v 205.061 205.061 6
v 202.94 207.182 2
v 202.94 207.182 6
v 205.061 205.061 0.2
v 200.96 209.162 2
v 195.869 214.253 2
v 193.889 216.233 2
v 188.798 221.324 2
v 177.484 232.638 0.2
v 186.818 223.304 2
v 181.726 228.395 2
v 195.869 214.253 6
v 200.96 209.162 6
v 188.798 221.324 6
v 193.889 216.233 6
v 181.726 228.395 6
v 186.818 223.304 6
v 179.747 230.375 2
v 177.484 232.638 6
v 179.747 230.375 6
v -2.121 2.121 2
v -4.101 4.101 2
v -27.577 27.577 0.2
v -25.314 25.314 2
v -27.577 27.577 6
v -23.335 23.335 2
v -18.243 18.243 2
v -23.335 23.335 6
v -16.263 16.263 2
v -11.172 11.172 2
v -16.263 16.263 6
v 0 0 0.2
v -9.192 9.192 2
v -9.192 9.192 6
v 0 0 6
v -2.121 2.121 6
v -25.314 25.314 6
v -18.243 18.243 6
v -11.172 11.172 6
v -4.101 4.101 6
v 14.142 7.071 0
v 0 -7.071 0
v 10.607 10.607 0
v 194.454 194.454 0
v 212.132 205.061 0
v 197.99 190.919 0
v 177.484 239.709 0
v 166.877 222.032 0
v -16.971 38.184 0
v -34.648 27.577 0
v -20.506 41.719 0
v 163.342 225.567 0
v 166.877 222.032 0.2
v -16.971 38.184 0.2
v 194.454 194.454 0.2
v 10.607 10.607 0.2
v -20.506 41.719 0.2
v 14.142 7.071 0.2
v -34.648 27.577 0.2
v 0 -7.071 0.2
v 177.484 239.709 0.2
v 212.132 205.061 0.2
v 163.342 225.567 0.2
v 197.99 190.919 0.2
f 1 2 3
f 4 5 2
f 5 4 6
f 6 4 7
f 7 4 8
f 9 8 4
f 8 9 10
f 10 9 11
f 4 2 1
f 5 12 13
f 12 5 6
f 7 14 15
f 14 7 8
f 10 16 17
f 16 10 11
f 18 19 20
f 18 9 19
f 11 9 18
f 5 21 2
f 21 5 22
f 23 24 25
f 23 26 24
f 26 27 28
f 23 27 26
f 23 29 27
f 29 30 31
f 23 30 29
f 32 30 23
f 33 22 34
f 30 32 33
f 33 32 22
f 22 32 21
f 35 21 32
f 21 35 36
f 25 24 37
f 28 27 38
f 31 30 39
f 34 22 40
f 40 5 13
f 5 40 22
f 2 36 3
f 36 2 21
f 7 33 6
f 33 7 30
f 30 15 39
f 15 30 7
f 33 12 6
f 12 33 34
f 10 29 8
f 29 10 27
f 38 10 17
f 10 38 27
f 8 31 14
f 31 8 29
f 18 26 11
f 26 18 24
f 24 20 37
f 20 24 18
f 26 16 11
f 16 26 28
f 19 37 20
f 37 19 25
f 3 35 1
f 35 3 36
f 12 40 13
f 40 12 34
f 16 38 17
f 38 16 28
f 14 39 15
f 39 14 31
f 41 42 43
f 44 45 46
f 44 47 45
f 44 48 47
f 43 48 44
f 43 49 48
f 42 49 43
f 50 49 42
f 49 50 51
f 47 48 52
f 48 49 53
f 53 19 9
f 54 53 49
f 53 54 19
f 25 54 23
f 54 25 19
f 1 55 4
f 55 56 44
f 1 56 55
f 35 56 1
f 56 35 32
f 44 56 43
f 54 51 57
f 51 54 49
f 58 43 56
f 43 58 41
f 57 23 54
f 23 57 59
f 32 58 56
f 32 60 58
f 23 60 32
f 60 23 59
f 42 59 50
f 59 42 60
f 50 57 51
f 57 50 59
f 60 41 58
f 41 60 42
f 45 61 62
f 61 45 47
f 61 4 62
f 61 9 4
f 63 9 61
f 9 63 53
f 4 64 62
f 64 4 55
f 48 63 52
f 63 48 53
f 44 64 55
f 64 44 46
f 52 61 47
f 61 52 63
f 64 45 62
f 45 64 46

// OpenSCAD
// BlackForest

module tileDisplay(rows,cols = 3,stepX=60,stepY=41,wellX=53,wellY=35,th=0.6,depth=2.2) {
    inX = (stepX - wellX) / 2;
    inY = (stepY - wellY) / 2;
    lip = 3;
    fl = 0.6;
    for (r=[0:rows-1]) {
        for (c=[0:cols-1]) {
            translate([stepX*c + inX,stepY*r + inY,0]) {
                if (r) {
                    translate([0,-inY*2,0]) 
                        cube([th,inY*2,depth+fl]);
                    translate([wellX+th,-inY*2,0]) 
                        cube([th,inY*2,depth+fl]);
                }
                if (c) {
                    translate([-inX*2,0,0]) 
                        cube([inX*2,th,depth+fl]);
                    translate([-inX*2,wellY+th,0]) 
                        cube([inX*2,th,depth+fl]);
                }
                difference() {
                    cube([wellX+th+th,wellY+th+th,depth+fl]);
                    translate([lip+th,lip+th,-1]) 
                        cube([wellX-lip*2,wellY-lip*2,99]);
                    translate([th,th,fl]) 
                        cube([wellX,wellY,depth]);
                    translate([0,wellY/2+th-8,fl]) cube([10,16,99]);
                }
            }
        }
    }
}

module playerBox() {
    th = 0.6;
    fl = 0.6;
    w = 105;
    h = 52.2;
    difference() {
        cube([w+th+th,h+th+th,8.4+11+fl]);
        translate([th*4,th*4,fl]) cube([w-th*8,h-th*8,11]);
        translate([th,th,11+fl]) cube([w,h,8.4]); // tiles
        translate([w-th-th,h/2+th,8.4+11+fl]) rotate([0,90,0]) cylinder(h=99,r=8.4);
    }
}

module wheelBrace() {
    difference() {
        cube([290,39,6]);
        for (i=[0:3])
            translate([0,3 + i*10,2]) cube([290,2.8,99]);
    }
    translate([-5,-5,0]) cube([20,49,0.2]);
    translate([275,-5,0]) cube([20,49,0.2]);
}

//tileDisplay(2);
//tileDisplay(3);
//tileDisplay(4);
//tileDisplay(5);
//tileDisplay(7);

//playerBox();

rotate([0,0,45]) wheelBrace();
